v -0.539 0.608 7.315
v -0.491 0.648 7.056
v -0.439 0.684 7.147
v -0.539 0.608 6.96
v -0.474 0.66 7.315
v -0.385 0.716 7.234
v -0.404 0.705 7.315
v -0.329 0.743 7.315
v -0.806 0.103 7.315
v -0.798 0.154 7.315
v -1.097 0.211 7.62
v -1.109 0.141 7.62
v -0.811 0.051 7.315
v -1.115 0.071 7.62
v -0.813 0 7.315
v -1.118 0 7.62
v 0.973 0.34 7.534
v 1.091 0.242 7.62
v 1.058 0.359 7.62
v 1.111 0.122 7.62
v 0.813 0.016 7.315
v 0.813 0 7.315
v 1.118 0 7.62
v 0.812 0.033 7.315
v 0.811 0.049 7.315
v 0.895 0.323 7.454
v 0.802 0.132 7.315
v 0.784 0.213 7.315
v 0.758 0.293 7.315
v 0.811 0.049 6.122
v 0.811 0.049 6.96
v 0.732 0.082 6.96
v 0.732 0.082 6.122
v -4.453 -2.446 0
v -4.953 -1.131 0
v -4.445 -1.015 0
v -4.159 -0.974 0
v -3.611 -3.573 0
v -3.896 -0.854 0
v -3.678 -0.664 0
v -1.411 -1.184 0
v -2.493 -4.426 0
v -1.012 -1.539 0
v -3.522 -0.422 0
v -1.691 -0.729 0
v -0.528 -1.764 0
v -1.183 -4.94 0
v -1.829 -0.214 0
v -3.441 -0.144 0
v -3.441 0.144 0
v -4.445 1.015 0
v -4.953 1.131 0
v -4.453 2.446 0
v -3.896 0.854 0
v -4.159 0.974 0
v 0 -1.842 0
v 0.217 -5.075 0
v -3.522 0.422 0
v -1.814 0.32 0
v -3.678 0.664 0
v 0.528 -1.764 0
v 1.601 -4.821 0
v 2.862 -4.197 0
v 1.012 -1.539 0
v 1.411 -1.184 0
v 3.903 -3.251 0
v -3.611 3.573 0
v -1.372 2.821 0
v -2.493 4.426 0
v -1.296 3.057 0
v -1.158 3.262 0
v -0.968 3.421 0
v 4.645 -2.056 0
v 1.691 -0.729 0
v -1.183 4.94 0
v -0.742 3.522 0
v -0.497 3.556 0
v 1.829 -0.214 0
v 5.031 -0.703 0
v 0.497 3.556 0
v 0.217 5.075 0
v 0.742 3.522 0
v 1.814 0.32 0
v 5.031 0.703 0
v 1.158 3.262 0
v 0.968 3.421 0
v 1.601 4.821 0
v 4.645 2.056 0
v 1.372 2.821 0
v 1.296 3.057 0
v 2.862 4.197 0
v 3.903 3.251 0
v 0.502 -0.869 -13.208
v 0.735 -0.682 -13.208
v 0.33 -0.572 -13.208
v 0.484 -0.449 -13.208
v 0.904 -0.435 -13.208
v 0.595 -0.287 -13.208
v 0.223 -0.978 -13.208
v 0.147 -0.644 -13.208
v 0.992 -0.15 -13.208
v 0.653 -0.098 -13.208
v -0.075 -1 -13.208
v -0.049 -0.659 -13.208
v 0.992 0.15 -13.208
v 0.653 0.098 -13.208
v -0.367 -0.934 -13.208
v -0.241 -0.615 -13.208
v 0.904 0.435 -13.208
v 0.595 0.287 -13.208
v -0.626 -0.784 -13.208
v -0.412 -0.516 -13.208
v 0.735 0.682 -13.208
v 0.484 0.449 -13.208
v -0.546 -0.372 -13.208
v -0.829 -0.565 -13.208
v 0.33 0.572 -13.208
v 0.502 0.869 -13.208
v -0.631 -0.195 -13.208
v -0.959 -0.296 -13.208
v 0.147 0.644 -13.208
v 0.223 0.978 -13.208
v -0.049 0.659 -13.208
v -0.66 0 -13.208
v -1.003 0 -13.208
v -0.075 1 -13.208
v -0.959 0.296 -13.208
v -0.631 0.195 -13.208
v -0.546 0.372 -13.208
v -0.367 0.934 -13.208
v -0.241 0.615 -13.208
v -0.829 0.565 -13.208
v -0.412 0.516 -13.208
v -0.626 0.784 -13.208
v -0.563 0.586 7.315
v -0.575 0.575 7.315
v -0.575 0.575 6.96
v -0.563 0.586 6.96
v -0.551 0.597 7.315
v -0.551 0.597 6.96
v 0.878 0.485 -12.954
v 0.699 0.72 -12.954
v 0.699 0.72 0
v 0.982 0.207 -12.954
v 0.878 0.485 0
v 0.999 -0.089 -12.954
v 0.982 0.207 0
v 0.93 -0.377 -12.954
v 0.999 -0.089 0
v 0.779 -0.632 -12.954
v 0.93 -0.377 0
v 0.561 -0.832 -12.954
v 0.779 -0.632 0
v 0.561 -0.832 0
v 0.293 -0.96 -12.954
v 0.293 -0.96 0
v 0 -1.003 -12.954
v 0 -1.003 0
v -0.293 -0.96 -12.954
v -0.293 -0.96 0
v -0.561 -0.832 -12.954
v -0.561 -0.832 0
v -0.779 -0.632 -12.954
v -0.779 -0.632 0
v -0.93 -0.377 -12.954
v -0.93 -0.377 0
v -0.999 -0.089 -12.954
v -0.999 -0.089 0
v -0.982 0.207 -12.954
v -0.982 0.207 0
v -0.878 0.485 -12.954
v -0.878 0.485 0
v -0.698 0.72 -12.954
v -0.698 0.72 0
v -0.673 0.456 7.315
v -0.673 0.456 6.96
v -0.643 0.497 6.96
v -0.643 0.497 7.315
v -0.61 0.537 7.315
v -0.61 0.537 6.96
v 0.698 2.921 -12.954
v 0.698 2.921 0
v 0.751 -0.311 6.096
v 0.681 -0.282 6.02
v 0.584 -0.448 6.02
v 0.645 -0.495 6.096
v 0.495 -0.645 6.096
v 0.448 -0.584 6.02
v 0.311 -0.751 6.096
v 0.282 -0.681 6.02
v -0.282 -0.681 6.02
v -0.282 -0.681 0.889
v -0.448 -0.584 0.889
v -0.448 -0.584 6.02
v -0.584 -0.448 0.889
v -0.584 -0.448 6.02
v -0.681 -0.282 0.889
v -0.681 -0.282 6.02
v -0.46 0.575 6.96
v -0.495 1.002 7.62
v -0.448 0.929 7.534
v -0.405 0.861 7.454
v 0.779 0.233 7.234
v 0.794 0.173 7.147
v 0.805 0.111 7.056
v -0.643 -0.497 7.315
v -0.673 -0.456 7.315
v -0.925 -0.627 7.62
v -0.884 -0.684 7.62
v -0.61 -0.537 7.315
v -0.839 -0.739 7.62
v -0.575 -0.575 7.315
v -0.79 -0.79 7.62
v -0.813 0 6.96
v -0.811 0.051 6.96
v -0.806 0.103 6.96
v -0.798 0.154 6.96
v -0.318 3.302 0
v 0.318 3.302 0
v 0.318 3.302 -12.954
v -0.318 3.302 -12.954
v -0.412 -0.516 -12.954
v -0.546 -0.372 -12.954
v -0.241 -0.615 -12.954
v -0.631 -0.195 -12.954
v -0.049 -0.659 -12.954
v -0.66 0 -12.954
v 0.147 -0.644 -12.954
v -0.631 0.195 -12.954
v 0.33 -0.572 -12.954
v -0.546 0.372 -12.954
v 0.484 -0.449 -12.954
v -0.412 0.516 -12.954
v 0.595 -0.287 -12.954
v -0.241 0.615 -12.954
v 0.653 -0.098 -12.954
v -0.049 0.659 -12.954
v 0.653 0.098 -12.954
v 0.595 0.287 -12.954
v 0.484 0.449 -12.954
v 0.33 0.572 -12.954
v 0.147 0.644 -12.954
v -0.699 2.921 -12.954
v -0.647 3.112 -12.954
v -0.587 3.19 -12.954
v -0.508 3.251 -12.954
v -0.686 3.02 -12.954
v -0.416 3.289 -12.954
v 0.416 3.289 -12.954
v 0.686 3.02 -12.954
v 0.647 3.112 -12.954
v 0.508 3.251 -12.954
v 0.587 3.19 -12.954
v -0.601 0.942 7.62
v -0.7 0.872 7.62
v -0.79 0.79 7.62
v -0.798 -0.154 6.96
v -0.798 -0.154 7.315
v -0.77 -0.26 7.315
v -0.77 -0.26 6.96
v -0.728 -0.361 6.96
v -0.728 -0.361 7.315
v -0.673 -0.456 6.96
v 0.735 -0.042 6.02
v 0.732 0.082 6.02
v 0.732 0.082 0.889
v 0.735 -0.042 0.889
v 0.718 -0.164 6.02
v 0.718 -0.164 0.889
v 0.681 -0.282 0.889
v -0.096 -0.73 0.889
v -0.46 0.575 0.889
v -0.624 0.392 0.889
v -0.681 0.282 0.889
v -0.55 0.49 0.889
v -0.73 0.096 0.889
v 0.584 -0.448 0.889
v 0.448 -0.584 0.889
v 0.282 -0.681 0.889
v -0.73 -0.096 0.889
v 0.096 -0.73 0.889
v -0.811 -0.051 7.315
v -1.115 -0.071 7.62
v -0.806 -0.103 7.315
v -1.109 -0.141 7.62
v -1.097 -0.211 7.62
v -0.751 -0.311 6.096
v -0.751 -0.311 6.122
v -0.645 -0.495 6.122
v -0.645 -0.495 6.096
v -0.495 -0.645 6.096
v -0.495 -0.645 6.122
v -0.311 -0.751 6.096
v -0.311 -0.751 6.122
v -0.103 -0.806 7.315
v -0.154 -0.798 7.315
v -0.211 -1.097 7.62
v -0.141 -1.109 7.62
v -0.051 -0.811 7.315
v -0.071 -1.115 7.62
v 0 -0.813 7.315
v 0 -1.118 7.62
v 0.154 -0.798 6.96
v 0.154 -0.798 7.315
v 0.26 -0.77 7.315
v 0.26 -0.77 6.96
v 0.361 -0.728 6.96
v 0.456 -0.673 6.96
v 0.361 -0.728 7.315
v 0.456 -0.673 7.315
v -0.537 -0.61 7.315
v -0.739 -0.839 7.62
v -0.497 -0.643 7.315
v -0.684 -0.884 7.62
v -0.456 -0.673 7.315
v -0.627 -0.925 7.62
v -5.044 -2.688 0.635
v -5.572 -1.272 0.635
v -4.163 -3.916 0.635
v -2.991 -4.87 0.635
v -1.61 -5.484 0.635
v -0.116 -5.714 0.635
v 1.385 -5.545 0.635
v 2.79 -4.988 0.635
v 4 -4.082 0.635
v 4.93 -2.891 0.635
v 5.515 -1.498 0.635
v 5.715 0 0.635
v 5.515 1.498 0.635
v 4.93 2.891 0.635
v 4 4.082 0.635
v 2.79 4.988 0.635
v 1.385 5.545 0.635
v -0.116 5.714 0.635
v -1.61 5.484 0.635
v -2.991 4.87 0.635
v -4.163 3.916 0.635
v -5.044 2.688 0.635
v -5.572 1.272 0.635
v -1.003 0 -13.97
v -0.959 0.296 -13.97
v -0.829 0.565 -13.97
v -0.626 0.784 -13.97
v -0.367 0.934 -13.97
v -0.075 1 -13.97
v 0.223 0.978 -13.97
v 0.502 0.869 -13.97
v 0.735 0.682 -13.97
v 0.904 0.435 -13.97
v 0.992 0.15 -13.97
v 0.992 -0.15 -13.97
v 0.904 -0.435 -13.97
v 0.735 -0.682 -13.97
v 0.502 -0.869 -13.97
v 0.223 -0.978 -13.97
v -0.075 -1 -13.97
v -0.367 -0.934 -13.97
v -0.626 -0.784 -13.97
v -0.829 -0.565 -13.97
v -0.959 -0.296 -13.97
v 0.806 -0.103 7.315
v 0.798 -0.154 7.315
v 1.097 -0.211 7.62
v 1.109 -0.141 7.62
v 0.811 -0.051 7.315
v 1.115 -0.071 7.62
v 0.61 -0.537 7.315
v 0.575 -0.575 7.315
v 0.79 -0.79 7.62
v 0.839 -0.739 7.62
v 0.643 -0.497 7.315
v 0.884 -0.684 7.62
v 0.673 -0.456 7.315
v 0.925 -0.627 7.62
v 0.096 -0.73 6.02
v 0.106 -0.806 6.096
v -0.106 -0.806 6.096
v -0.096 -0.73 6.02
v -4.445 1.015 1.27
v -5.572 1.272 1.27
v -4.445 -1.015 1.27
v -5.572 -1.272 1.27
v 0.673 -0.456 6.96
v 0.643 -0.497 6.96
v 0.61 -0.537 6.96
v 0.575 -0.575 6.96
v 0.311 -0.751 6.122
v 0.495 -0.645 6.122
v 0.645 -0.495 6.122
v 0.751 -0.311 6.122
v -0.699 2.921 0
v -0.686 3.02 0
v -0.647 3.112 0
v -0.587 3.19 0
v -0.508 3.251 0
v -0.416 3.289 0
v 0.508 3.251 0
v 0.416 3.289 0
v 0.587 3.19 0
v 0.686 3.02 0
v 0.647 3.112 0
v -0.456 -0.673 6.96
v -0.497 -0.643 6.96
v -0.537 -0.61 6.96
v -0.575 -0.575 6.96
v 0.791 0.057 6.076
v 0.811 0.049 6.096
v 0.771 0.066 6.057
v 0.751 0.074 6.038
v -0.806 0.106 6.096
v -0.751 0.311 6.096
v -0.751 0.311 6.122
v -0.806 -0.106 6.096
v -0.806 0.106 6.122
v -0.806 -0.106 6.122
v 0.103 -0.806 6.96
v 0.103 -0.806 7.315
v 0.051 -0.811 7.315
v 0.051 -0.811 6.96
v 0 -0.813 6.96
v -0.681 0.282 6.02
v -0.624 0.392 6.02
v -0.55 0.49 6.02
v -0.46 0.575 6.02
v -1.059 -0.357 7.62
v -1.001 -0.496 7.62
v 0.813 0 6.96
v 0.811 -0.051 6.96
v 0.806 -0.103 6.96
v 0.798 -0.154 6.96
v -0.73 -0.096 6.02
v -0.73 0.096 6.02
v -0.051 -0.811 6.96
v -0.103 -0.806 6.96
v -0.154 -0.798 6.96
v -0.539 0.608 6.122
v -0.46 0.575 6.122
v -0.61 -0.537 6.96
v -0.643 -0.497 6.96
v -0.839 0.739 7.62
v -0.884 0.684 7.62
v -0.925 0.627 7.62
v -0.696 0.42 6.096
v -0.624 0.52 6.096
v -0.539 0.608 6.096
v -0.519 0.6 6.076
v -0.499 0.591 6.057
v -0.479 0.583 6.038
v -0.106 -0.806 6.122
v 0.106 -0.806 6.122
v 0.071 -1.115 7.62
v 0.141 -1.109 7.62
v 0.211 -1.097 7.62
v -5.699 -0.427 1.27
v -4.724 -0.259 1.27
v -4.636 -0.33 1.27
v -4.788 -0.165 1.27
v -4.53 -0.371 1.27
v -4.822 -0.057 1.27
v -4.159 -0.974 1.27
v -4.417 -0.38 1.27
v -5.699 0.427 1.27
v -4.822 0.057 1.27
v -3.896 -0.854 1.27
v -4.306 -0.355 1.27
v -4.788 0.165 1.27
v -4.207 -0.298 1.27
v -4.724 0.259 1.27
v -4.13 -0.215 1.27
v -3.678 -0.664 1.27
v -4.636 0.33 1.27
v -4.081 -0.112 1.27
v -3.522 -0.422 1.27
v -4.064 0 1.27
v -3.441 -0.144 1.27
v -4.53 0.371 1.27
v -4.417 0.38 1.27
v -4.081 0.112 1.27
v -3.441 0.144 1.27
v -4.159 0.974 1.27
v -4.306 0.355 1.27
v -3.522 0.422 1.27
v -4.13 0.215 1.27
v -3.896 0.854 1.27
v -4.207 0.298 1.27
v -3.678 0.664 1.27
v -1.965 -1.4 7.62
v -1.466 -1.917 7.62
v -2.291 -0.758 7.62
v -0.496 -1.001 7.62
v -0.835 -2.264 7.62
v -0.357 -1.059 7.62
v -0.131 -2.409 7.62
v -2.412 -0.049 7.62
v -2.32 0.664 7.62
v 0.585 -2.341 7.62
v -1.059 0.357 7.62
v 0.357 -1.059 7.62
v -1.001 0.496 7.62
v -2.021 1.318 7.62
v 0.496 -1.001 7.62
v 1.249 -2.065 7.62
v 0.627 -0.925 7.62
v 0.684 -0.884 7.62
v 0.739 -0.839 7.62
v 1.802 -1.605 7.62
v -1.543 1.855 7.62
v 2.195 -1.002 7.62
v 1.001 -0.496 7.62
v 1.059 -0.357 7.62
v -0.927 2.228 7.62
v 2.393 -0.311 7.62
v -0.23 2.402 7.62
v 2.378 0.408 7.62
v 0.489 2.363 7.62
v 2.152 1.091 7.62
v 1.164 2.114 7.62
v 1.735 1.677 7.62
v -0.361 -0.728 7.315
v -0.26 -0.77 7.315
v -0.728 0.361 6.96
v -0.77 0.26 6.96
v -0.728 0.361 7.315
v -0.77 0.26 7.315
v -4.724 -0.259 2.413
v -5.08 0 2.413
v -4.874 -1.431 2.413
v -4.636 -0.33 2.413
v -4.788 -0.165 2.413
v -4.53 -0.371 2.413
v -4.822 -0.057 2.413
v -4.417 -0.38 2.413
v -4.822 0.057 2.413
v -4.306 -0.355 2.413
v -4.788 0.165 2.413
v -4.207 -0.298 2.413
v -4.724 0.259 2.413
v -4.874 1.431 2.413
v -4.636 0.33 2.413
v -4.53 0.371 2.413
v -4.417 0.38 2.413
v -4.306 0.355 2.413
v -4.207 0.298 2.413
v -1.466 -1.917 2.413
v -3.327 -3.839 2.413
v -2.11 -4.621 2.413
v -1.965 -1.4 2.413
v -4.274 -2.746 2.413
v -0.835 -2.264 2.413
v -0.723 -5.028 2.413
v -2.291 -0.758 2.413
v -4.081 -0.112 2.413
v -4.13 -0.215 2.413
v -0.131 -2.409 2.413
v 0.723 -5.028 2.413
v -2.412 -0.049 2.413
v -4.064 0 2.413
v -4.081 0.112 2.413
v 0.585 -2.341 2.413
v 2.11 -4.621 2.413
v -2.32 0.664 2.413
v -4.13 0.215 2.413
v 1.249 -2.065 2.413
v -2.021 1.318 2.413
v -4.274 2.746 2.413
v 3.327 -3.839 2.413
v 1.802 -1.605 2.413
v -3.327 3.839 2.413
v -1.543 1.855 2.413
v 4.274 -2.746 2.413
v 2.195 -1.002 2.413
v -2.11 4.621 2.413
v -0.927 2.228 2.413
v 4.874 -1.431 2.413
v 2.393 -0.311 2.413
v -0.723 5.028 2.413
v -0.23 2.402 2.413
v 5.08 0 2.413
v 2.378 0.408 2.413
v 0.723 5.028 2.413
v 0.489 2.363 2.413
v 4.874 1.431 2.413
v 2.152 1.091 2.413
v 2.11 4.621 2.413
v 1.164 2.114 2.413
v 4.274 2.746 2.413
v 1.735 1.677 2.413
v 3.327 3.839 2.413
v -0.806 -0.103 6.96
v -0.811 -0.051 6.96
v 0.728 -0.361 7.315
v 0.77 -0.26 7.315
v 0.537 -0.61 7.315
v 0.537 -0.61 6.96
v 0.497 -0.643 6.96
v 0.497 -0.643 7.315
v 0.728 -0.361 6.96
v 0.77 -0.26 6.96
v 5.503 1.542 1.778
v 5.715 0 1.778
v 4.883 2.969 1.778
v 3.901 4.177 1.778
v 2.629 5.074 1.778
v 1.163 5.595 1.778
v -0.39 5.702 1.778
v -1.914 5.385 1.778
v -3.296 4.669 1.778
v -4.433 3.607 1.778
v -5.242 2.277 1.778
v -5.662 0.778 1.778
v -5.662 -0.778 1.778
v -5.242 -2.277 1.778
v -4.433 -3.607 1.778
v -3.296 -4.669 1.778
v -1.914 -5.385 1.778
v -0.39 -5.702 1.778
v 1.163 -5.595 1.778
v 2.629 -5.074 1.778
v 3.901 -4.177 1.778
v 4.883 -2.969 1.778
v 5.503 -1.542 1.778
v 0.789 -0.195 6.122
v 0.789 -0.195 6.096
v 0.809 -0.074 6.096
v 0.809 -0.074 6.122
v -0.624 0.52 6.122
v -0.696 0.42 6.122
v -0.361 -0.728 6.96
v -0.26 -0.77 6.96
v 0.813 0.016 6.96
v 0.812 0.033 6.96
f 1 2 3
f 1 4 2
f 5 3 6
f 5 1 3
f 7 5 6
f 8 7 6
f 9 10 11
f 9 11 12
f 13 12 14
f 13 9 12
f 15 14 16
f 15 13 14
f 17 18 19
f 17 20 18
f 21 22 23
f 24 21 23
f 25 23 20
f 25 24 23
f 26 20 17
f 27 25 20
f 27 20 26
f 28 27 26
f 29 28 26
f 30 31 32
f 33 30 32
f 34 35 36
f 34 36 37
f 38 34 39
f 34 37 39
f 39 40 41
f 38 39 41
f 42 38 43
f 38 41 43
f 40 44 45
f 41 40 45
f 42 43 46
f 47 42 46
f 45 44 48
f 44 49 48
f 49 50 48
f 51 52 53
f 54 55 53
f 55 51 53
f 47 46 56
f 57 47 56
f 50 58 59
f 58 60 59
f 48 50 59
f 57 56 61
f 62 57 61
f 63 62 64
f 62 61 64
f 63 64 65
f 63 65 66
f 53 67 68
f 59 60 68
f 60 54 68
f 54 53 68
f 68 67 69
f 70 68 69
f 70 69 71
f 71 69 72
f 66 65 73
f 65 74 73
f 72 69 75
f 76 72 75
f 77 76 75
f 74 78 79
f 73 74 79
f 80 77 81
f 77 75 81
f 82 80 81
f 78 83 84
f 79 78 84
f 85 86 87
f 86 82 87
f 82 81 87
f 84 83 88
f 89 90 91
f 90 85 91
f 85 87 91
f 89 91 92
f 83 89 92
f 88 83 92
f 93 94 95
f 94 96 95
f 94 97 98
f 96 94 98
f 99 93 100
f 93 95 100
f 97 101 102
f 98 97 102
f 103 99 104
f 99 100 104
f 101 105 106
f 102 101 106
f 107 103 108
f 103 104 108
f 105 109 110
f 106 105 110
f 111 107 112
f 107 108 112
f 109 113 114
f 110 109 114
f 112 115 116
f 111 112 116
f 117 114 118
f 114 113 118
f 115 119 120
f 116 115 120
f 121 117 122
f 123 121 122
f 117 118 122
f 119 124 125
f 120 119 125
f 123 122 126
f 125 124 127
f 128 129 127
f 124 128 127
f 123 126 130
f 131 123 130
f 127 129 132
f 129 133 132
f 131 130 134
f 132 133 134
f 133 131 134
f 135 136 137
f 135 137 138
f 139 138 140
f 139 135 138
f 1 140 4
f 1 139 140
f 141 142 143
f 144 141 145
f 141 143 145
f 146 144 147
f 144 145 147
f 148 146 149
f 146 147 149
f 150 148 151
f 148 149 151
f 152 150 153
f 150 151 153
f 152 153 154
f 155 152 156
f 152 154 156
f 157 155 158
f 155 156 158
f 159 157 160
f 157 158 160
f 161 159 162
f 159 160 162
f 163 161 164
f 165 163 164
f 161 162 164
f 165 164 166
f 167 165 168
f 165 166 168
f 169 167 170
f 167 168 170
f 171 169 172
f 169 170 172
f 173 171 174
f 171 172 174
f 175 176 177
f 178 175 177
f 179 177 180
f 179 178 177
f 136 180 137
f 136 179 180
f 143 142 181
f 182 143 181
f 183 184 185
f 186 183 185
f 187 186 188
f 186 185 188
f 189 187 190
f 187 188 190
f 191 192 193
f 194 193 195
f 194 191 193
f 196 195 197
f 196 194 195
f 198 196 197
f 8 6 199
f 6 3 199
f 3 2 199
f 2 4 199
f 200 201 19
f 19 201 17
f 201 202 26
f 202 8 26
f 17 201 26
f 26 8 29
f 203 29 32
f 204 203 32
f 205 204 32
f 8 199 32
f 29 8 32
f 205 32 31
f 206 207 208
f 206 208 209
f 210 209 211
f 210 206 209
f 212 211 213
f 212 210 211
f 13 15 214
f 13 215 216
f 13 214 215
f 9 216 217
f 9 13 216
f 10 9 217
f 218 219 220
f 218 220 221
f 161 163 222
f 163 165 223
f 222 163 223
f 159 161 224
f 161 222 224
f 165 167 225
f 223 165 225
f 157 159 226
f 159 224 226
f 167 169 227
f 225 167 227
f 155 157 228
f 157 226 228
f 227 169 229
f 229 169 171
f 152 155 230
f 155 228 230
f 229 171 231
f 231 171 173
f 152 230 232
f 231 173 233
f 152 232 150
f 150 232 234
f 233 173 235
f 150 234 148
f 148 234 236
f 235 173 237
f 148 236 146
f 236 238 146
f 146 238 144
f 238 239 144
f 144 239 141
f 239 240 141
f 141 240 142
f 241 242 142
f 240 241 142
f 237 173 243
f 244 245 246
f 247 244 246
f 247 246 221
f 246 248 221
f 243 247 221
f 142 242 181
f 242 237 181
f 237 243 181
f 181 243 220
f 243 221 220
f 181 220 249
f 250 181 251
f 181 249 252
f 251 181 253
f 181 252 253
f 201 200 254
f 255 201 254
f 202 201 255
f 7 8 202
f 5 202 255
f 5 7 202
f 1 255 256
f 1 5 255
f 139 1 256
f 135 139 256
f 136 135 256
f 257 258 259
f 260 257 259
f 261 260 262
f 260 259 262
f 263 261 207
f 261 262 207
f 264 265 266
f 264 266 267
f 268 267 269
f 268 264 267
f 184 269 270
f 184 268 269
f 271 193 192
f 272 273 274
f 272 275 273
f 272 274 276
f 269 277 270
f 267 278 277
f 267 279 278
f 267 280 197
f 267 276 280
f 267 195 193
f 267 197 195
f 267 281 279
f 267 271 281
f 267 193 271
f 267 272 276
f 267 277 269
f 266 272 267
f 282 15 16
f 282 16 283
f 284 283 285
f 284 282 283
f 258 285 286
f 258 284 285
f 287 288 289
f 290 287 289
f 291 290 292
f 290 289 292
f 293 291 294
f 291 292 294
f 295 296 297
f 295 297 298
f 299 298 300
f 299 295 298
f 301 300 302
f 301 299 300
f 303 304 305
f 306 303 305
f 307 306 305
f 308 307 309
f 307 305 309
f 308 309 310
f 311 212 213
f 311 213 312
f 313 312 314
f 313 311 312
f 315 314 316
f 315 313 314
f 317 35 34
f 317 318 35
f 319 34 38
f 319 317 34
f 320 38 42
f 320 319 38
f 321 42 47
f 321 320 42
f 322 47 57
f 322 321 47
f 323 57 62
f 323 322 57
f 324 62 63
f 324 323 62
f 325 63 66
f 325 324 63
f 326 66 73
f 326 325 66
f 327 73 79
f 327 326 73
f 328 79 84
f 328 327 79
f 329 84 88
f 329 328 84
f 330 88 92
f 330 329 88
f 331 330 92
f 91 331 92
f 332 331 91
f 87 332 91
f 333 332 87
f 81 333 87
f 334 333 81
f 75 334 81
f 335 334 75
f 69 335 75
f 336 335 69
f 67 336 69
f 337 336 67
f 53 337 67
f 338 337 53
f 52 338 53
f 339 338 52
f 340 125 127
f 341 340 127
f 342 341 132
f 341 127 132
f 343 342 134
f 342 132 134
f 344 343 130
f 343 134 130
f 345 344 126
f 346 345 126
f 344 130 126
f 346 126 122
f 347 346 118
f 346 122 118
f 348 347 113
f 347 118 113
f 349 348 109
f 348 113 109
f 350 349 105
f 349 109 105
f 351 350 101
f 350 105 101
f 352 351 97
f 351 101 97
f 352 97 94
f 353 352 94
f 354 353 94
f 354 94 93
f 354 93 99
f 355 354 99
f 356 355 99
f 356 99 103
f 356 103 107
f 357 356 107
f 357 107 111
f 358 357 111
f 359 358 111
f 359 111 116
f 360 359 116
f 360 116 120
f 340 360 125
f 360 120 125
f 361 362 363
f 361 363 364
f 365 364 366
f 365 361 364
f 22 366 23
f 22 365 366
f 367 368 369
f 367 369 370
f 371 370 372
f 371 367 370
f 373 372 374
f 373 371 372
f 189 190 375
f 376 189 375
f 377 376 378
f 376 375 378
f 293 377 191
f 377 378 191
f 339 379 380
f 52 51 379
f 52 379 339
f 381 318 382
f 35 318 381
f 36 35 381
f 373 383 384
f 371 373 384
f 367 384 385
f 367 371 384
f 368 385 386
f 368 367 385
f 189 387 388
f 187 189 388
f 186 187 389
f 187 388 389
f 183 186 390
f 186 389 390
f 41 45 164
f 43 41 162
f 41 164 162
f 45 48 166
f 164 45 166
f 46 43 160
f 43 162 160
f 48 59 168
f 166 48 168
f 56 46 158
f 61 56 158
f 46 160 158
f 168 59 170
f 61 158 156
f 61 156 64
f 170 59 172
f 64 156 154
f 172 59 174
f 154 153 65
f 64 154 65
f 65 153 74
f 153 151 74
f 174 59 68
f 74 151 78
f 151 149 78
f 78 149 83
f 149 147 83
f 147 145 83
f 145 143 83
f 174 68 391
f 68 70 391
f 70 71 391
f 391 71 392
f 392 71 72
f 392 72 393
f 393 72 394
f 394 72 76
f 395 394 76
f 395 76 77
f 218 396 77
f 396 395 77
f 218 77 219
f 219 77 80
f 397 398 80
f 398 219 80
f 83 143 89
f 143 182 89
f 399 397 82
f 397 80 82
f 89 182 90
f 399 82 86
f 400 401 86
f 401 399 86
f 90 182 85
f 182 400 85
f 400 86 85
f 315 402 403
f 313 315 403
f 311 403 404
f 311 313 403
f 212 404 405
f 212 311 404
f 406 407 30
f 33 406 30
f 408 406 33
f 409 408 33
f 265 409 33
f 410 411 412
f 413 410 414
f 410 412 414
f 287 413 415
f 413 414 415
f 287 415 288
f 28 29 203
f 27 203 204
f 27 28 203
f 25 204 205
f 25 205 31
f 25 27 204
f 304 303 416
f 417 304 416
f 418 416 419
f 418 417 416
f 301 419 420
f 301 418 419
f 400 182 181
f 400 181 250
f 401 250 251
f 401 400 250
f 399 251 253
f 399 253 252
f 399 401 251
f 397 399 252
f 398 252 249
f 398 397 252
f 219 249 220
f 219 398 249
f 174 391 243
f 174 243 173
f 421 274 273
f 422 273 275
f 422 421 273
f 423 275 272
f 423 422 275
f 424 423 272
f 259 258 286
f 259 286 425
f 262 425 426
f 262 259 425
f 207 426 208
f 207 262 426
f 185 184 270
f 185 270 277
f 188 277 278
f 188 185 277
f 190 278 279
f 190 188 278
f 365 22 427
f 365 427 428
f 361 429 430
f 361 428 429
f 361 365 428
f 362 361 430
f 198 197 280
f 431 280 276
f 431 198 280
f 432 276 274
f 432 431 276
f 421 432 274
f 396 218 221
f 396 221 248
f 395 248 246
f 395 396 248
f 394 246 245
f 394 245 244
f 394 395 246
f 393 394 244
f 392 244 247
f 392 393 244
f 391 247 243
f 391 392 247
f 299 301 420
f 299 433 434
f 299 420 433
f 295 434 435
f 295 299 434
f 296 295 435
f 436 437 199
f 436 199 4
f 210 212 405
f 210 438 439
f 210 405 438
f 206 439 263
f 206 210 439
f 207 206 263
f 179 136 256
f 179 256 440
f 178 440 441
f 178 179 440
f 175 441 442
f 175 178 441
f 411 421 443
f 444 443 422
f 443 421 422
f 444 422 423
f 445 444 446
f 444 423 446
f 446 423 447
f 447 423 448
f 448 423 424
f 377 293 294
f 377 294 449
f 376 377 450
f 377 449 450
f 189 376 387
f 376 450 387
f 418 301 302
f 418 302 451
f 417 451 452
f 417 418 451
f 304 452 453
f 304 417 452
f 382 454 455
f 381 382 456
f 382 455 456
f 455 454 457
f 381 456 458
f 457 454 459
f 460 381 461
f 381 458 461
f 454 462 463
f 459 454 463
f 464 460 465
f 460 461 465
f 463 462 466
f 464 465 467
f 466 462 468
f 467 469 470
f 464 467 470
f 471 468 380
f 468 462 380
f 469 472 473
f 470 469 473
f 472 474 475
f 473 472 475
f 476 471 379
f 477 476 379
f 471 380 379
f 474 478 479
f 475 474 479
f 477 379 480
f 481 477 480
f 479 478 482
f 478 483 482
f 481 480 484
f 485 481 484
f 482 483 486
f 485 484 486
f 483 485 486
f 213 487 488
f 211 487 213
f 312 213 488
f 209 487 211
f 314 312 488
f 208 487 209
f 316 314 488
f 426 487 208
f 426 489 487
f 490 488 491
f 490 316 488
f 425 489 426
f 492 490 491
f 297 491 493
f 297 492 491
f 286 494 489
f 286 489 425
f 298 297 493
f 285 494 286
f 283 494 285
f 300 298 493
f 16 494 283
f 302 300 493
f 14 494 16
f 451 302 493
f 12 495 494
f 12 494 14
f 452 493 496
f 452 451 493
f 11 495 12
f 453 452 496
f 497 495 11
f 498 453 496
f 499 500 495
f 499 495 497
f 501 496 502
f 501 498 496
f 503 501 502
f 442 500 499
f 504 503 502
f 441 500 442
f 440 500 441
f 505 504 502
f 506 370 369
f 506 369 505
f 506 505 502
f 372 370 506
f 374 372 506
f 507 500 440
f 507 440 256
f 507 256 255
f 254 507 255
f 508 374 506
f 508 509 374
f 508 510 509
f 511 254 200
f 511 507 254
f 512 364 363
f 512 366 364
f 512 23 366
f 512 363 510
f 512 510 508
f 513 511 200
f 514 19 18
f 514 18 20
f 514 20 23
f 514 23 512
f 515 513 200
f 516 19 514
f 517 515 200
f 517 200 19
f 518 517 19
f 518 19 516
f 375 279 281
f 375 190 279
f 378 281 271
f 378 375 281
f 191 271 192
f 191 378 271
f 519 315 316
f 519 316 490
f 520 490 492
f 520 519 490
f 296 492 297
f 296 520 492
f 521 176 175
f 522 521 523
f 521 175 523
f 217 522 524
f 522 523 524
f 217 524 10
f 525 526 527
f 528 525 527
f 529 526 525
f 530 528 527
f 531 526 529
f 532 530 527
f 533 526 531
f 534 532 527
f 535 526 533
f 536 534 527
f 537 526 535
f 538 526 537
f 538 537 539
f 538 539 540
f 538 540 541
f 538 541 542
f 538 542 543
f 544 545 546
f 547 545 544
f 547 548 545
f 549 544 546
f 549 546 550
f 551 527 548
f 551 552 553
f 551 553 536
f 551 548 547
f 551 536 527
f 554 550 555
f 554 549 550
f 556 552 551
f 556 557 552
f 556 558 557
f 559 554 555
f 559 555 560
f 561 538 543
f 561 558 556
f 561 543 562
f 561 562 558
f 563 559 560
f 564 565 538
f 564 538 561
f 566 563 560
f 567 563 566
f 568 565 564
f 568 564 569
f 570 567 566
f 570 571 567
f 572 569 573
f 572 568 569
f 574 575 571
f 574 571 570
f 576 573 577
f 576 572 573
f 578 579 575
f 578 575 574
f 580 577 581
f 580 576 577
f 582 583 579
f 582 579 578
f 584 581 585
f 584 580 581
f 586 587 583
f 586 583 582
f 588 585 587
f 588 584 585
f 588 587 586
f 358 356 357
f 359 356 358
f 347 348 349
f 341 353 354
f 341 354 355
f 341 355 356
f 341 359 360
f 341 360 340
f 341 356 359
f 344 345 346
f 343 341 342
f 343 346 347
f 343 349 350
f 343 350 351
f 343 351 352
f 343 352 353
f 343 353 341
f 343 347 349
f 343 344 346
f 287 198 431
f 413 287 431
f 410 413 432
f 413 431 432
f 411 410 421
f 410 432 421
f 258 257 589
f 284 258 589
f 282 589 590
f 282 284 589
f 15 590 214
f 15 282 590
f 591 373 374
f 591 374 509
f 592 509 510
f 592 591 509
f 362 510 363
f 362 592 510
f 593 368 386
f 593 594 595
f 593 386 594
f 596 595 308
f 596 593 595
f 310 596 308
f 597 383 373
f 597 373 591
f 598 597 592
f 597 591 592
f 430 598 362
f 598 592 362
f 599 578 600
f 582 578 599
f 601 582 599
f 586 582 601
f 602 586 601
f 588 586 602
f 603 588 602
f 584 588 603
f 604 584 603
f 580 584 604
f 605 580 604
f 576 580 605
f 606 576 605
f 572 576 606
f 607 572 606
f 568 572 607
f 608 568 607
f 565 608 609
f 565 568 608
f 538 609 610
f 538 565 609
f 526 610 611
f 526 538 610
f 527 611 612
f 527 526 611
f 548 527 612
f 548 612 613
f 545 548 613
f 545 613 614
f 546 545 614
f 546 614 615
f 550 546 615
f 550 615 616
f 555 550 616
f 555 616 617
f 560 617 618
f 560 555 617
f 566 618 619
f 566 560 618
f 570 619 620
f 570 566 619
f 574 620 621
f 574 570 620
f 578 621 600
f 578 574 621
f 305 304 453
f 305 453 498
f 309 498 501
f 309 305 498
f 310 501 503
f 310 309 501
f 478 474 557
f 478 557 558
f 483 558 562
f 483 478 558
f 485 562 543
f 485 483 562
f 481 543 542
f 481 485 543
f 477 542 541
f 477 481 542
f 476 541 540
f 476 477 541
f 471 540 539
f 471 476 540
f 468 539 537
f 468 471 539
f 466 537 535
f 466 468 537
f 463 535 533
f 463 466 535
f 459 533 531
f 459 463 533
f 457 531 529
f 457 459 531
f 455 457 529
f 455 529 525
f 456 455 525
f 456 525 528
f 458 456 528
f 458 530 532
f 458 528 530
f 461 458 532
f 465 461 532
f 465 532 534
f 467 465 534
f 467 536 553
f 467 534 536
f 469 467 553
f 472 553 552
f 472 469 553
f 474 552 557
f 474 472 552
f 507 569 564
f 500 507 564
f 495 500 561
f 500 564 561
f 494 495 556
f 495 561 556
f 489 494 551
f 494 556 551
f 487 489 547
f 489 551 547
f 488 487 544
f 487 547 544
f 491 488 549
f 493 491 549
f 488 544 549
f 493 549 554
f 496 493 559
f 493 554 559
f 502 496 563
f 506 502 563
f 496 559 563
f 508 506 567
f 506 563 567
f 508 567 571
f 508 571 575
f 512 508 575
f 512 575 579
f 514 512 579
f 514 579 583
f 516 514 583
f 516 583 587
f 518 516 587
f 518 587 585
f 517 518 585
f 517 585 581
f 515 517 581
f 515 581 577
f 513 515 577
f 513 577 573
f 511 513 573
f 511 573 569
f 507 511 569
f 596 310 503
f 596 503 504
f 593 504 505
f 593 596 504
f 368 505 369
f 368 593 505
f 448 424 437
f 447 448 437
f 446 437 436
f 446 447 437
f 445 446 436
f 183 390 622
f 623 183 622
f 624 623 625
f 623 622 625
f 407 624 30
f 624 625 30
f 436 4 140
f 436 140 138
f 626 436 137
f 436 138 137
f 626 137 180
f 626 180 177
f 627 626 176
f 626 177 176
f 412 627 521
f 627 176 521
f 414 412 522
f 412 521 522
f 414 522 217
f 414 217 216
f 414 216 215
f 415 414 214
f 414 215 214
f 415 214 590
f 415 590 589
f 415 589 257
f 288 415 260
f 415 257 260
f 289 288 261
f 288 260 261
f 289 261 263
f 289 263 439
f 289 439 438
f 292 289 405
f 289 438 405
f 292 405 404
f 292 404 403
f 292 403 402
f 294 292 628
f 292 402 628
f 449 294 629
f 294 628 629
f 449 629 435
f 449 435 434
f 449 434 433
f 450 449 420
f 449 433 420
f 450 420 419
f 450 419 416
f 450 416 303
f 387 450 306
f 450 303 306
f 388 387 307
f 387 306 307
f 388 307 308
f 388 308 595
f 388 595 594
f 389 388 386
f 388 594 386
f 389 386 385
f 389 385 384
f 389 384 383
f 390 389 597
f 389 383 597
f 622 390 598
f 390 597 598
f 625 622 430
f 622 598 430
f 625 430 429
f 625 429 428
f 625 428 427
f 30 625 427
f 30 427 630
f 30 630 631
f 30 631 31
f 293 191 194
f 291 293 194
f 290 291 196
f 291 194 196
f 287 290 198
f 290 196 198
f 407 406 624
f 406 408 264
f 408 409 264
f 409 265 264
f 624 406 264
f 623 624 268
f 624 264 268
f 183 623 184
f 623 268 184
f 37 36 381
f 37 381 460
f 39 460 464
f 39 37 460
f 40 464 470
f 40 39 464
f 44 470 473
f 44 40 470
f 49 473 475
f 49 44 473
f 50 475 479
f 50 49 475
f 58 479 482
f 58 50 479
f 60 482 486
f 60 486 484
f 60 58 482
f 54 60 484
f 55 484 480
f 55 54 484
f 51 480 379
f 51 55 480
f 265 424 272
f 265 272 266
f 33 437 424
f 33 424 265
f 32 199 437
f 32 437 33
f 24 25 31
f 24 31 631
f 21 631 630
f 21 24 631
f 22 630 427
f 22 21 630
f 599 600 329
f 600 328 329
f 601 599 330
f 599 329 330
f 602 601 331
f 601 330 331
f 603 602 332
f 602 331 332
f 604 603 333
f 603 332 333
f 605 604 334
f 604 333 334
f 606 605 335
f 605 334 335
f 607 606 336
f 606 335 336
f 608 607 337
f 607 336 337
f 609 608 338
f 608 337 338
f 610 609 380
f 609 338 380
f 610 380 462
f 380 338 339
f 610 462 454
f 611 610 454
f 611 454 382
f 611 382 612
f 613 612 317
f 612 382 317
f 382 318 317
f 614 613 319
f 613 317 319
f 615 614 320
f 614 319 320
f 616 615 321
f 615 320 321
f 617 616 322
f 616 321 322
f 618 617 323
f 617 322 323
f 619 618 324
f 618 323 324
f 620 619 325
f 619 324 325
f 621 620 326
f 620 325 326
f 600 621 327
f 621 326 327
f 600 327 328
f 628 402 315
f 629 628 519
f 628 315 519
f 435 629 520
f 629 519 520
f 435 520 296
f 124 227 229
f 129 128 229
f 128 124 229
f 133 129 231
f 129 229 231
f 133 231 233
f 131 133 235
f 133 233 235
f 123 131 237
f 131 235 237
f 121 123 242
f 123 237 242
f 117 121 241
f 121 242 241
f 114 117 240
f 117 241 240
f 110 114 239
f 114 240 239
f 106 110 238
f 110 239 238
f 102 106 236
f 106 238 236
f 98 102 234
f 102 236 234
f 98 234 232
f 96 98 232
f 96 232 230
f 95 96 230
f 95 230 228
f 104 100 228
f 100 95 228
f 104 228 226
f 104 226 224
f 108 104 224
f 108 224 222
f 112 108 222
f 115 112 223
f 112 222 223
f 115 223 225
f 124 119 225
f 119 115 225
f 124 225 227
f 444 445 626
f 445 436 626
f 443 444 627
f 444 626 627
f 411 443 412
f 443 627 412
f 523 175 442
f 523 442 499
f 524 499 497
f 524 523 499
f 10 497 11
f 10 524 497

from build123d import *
from build123d.topology import SkipClean

# Parameters (mm, degrees)
EXTRUDE1_DEPTH               = 0.000254
SKETCH8_R                    = 2.413
EXTRUDE8_DEPTH               = 7.62
SKETCH6_R                    = 5.715
EXTRUDE6_DEPTH               = 2.413
SKETCH4_R                    = 0.254
EXTRUDE4_DEPTH               = 6.731
SKETCH5_R                    = 1.0033
EXTRUDE5_DEPTH               = 12.954
FILLET2_R                    = 0.889
CHAMFER1_SIZE                = 0.635
CHAMFER3_SIZE                = 0.635
EXTRUDE9_DEPTH               = 12.954
EXTRUDE11_DEPTH              = 6.731
CIRPATTERN1_COUNT            = 8
EXTRUDE12_DEPTH              = 6.731
CHAMFER4_SIZE                = 0.381
CHAMFER4_SIZE2               = 0.659911358
EXTRUDE13_DEPTH              = 0.6604
CUT_REVOLVE1_ANGLE           = 130
CUT_REVOLVE1_OTHER_WAY_ANGLE = 90
BOSS_EXTRUDE1_DEPTH          = 6.071088642
CUT_EXTRUDE1_DEPTH           = 0.838688642
CHAMFER5_SIZE                = 0.1016
CHAMFER6_SIZE                = 0.3048
SKETCH27_R                   = 0.381
CUT_EXTRUDE5_DEPTH           = 16.268548261
CUT_EXTRUDE7_DEPTH           = 1.27
SKETCH29_R                   = 0.6604
BOSS_EXTRUDE2_DEPTH          = 1.016
BOSS_EXTRUDE3_START          = -0.762
SKETCH30_R                   = 1.0033
BOSS_EXTRUDE3_DEPTH          = 0.762


with BuildPart() as part:
    # Sketch1 → Extrude1 (new body)
    with BuildSketch(Plane.XY):
        with BuildLine():
            Line((-1.242889362, 3.556), (-1.813523477, 0.319773119))
            ThreePointArc((-1.813523477, 0.319773119), (0, -1.8415), (1.813523477, 0.319773119))
            Line((1.813523477, 0.319773119), (1.242889362, 3.556))
            Line((1.242889362, 3.556), (-1.242889362, 3.556))
        make_face()
    extrude(amount=EXTRUDE1_DEPTH)

    # Sketch8 → Extrude8 (add)
    with BuildSketch(Plane.XY.offset(0.000254)):
        with Locations(Location((0, 0, 0), (0, 0, 129.743387424))):
            Circle(SKETCH8_R)
    extrude(amount=EXTRUDE8_DEPTH)

    # Sketch6 → Extrude6 (add)
    with BuildSketch(Plane.XY.offset(0.000254)):
        Circle(SKETCH6_R)
    extrude(amount=EXTRUDE6_DEPTH)

    # Sketch4 → Extrude4 (cut)
    with BuildSketch(Plane.XY.offset(7.620254)):
        Circle(SKETCH4_R)
    extrude(amount=-EXTRUDE4_DEPTH, mode=Mode.SUBTRACT)

    # Sketch5 → Extrude5 (add)
    with BuildSketch(Plane(origin=(0, 0, 0), x_dir=(-1, 0, 0), z_dir=(0, 0, -1))):
        with Locations(Location((0, 0, 0), (0, 0, 180))):
            Circle(SKETCH5_R)
    extrude(amount=EXTRUDE5_DEPTH)

    # Fillet2
    fillet2_edges = [part.edges().sort_by_distance(p)[0] for p in [
        (1.242889362, 3.556, 0.000127),
        (-1.242889362, 3.556, 0.000127),
    ]]
    fillet(fillet2_edges, radius=FILLET2_R)

    # Chamfer1
    chamfer1_edges = [part.edges().sort_by_distance(p)[0] for p in [
        (-5.715, 0, 0.000254),
    ]]
    chamfer(chamfer1_edges, length=CHAMFER1_SIZE)

    # Chamfer3
    chamfer3_edges = [part.edges().sort_by_distance(p)[0] for p in [
        (-5.715, 0, 2.413254),
    ]]
    chamfer(chamfer3_edges, length=CHAMFER3_SIZE)

    # Sketch9 → Extrude9 (add)
    with BuildSketch(Plane(origin=(0, 0, 0), x_dir=(-1, 0, 0), z_dir=(0, 0, -1))):
        with BuildLine():
            Line((-0.3175, 3.302), (0.3175, 3.302))
            ThreePointArc((0.3175, 3.302), (0.586907684, 3.190407684), (0.6985, 2.921))
            Line((0.6985, 2.921), (0.6985, 0))
            Line((0.6985, 0), (-0.6985, 0))
            Line((-0.6985, 0), (-0.6985, 2.921))
            ThreePointArc((-0.6985, 2.921), (-0.586907684, 3.190407684), (-0.3175, 3.302))
        make_face()
    extrude(amount=EXTRUDE9_DEPTH)

    # Sketch17 → Extrude11 (cut)
    with BuildSketch(Plane.XY.offset(7.620254)):
        with BuildLine():
            Line((0, 0), (0, 0.8128))
            ThreePointArc((0, 0.8128), (0.077181384, 0.80912723), (0.153665255, 0.798142111))
            ThreePointArc((0.153665255, 0.798142111), (0.281884616, 0.680529664), (0.455713955, 0.673029443))
            ThreePointArc((0.455713955, 0.673029443), (0.517563871, 0.626714831), (0.574736392, 0.574736392))
            Line((0.574736392, 0.574736392), (0, 0))
        make_face()
    extrude11 = extrude(amount=-EXTRUDE11_DEPTH, mode=Mode.SUBTRACT)

    # CirPattern1: Extrude11 ×8 about axis
    cirpattern1_axis = Axis((0, 0, 0), (0, 0, 1))
    for i in range(1, CIRPATTERN1_COUNT):
        add(extrude11.rotate(cirpattern1_axis, i * 360 / CIRPATTERN1_COUNT), mode=Mode.SUBTRACT)

    # Sketch18 → Extrude12 (add)
    with BuildSketch(Plane.XY.offset(7.620254)):
        Polygon((-0.539167209, 0.608229037), (0.811331666, 0.048834087), (0.986294531, 0.471231809), (-0.364204343, 1.030626759), align=None)
    extrude(amount=-EXTRUDE12_DEPTH)

    # Chamfer4
    chamfer4_edges = [part.edges().sort_by_distance(p)[0] for p in [
        (0.136082229, 0.328531562, 7.620254),
    ]]
    chamfer4_side = [part.faces().sort_by_distance(p)[0] for p in [
        (1.499116567, -1.802914954, 7.620254),
    ]]
    chamfer(chamfer4_edges, length=CHAMFER4_SIZE, length2=CHAMFER4_SIZE2, reference=chamfer4_side[0])

    # Sketch19 → Extrude13 (cut)
    with SkipClean():  # the faces are left unmerged after this step: merging them gives an invalid solid
        with BuildSketch(Plane.XY.offset(7.620254)):
            with BuildLine():
                Line((0.811331666, 0.048834087), (-0.539167209, 0.608229037))
                ThreePointArc((-0.539167209, 0.608229037), (-0.311045094, -0.750929284), (0.811331666, 0.048834087))
            make_face()
        extrude(amount=-EXTRUDE13_DEPTH, mode=Mode.SUBTRACT)

    # Sketch20 → Cut-Revolve1 (revolve, cut)
    with SkipClean():  # the faces are left unmerged after this step: merging them gives an invalid solid
        with BuildSketch(Plane(origin=(0, 0, 0), x_dir=(0, 0, -1), z_dir=(1, 0, 0))):
            Polygon((-6.959854, -0.8128), (-6.959854, 0), (-6.147054, 0), align=None)
        revolve(axis=Axis((0, 0, 7.389643883), (0, 0, -1)), revolution_arc=CUT_REVOLVE1_ANGLE, mode=Mode.SUBTRACT)

    # Sketch20 → Cut-Revolve1 other way (revolve, cut)
    with SkipClean():  # the faces are left unmerged after this step: merging them gives an invalid solid
        with BuildSketch(Plane(origin=(0, 0, 0), x_dir=(0, 0, -1), z_dir=(1, 0, 0))):
            Polygon((-6.959854, -0.8128), (-6.959854, 0), (-6.147054, 0), align=None)
        revolve(axis=Axis((0, 0, 7.389643883), (0, 0, 1)), revolution_arc=CUT_REVOLVE1_OTHER_WAY_ANGLE, mode=Mode.SUBTRACT)

    # Sketch21 → Boss-Extrude1 (add)
    with SkipClean():  # the faces are left unmerged after this step: merging them gives an invalid solid
        with BuildSketch(Plane.XY.offset(6.960342642)):
            with BuildLine():
                Line((-0.459893976, 0.575392988), (-0.539167209, 0.608229037))
                ThreePointArc((-0.539167209, 0.608229037), (-0.311045094, -0.750929284), (0.811331666, 0.048834087))
                Line((0.811331666, 0.048834087), (0.732058433, 0.081670135))
                ThreePointArc((0.732058433, 0.081670135), (-0.281884616, -0.680529664), (-0.459893976, 0.575392988))
            make_face()
        extrude(amount=-BOSS_EXTRUDE1_DEPTH)

    # Sketch22 → Cut-Extrude1 (cut)
    with SkipClean():  # the faces are left unmerged after this step: merging them gives an invalid solid
        with BuildSketch(Plane.XY.offset(6.960342642)):
            with BuildLine():
                Line((-0.459893976, 0.575392988), (-0.539167209, 0.608229037))
                ThreePointArc((-0.539167209, 0.608229037), (-0.311045094, -0.750929284), (0.811331666, 0.048834087))
                Line((0.811331666, 0.048834087), (0.732058433, 0.081670135))
                ThreePointArc((0.732058433, 0.081670135), (-0.281884616, -0.680529664), (-0.459893976, 0.575392988))
            make_face()
        extrude(amount=-CUT_EXTRUDE1_DEPTH, mode=Mode.SUBTRACT)

    # Chamfer5
    # the kernel refuses this chamfer: 0.1016 mm, written as the material it takes off along each edge
    with BuildSketch(Plane(origin=(0, 0, 6.121654), x_dir=(-0.3826834323650876, -0.9238795325112875, 0), z_dir=(0.9238795325112875, -0.3826834323650876, 0))) as chamfer5_piece_1_section:
        Polygon((0.7366 + CHAMFER5_SIZE, 0), (0.7366, CHAMFER5_SIZE), (0.7366, 0), align=None)
    chamfer5_piece_1 = revolve(axis=Axis((0, 0, 6.121654), (0, 0, -1)), revolution_arc=45, mode=Mode.PRIVATE)
    chamfer5_piece_1 = chamfer5_piece_1 & Plane(origin=(0, 0, 6.086219336), x_dir=(-0.6633454831704748, 0.74831328329606, 0), z_dir=(0, 0, 1)) * Cylinder(0.8128, 4, mode=Mode.PRIVATE)
    add(chamfer5_piece_1, mode=Mode.SUBTRACT)
    with BuildSketch(Plane(origin=(0, 0, 6.121654), x_dir=(0.3826834323650712, -0.9238795325112945, 0), z_dir=(0.9238795325112945, 0.3826834323650712, 0))) as chamfer5_piece_2_section:
        Polygon((0.7366 + CHAMFER5_SIZE, 0), (0.7366, CHAMFER5_SIZE), (0.7366, 0), align=None)
    chamfer5_piece_2 = revolve(axis=Axis((0, 0, 6.121654), (0, 0, -1)), revolution_arc=45, mode=Mode.PRIVATE)
    chamfer5_piece_2 = chamfer5_piece_2 & Plane(origin=(0, 0, 6.086219336), x_dir=(-0.6633454831704748, 0.74831328329606, 0), z_dir=(0, 0, 1)) * Cylinder(0.8128, 4, mode=Mode.PRIVATE)
    add(chamfer5_piece_2, mode=Mode.SUBTRACT)
    with BuildSketch(Plane(origin=(0, 0, 6.121654), x_dir=(-0.9238795325112938, -0.3826834323650728, 0), z_dir=(0.3826834323650728, -0.9238795325112938, 0))) as chamfer5_piece_3_section:
        Polygon((0.7366 + CHAMFER5_SIZE, 0), (0.7366, CHAMFER5_SIZE), (0.7366, 0), align=None)
    chamfer5_piece_3 = revolve(axis=Axis((0, 0, 6.121654), (0, 0, -1)), revolution_arc=45, mode=Mode.PRIVATE)
    chamfer5_piece_3 = chamfer5_piece_3 & Plane(origin=(0, 0, 6.086219336), x_dir=(-0.6633454831704748, 0.74831328329606, 0), z_dir=(0, 0, 1)) * Cylinder(0.8128, 4, mode=Mode.PRIVATE)
    add(chamfer5_piece_3, mode=Mode.SUBTRACT)
    with BuildSketch(Plane(origin=(0, 0, 6.121654), x_dir=(-0.9238795325112764, 0.3826834323651145, 0), z_dir=(-0.3826834323651145, -0.9238795325112764, 0))) as chamfer5_piece_4_section:
        Polygon((0.7366 + CHAMFER5_SIZE, 0), (0.7366, CHAMFER5_SIZE), (0.7366, 0), align=None)
    chamfer5_piece_4 = revolve(axis=Axis((0, 0, 6.121654), (0, 0, -1)), revolution_arc=49.190233443, mode=Mode.PRIVATE)
    chamfer5_piece_4 = chamfer5_piece_4 & Plane(origin=(0, 0, 6.085867455), x_dir=(-0.6633454831704748, 0.74831328329606, 0), z_dir=(0, 0, 1)) * Cylinder(0.8128, 4, mode=Mode.PRIVATE)
    chamfer5_piece_4 = split(chamfer5_piece_4, bisect_by=Plane(origin=(-0.544175649, 0.610303601, 6.085867455), z_dir=(-0.38268343236508656, -0.9238795325112882, 0)), keep=Keep.TOP, mode=Mode.PRIVATE)
    add(chamfer5_piece_4, mode=Mode.SUBTRACT)
    with BuildSketch(Plane(origin=(0, 0, 6.121654), x_dir=(0.9238795325112772, -0.3826834323651127, 0), z_dir=(0.3826834323651127, 0.9238795325112772, 0))) as chamfer5_piece_5_section:
        Polygon((0.7366 + CHAMFER5_SIZE, 0), (0.7366, CHAMFER5_SIZE), (0.7366, 0), align=None)
    chamfer5_piece_5 = revolve(axis=Axis((0, 0, 6.121654), (0, 0, -1)), revolution_arc=45, mode=Mode.PRIVATE)
    chamfer5_piece_5 = chamfer5_piece_5 & Plane(origin=(0, 0, 6.086219336), x_dir=(-0.6633454831704748, 0.74831328329606, 0), z_dir=(0, 0, 1)) * Cylinder(0.8128, 4, mode=Mode.PRIVATE)
    add(chamfer5_piece_5, mode=Mode.SUBTRACT)
    with BuildSketch(Plane(origin=(0, 0, 6.121654), x_dir=(0.8934479656215565, 0.44916670928142266, 0), z_dir=(-0.44916670928142266, 0.8934479656215565, 0))) as chamfer5_piece_6_section:
        Polygon((0.7366 + CHAMFER5_SIZE, 0), (0.7366, CHAMFER5_SIZE), (0.7366, 0), align=None)
    chamfer5_piece_6 = revolve(axis=Axis((0, 0, 6.121654), (0, 0, -1)), revolution_arc=49.190233443, mode=Mode.PRIVATE)
    chamfer5_piece_6 = chamfer5_piece_6 & Plane(origin=(0, 0, 6.085867455), x_dir=(-0.6633454831704748, 0.74831328329606, 0), z_dir=(0, 0, 1)) * Cylinder(0.8128, 4, mode=Mode.PRIVATE)
    chamfer5_piece_6 = split(chamfer5_piece_6, bisect_by=Plane(origin=(0.816340106, 0.046759523, 6.085867455), z_dir=(-0.38268343236508556, -0.9238795325112885, 0)), keep=Keep.TOP, mode=Mode.PRIVATE)
    add(chamfer5_piece_6, mode=Mode.SUBTRACT)

    # Chamfer6
    chamfer6_edges = [part.edges().sort_by_distance(p)[0] for p in [
        (-0.311045094, -0.750929284, 7.620254),
    ]]
    chamfer(chamfer6_edges, length=CHAMFER6_SIZE)

    # Sketch27 → Cut-Extrude5 (cut, through all)
    with BuildSketch(Plane.XY):
        with Locations((-4.445, 0)):
            Circle(SKETCH27_R)
    extrude(amount=CUT_EXTRUDE5_DEPTH, mode=Mode.SUBTRACT)

    # Sketch28 → Cut-Extrude7 (cut)
    with BuildSketch(Plane(origin=(0, 0, 0.000254), x_dir=(-1, 0, 0), z_dir=(0, 0, -1))):
        with BuildLine():
            Line((4.445, 1.014677811), (6.190751279, 1.413187392))
            ThreePointArc((6.190751279, 1.413187392), (6.35, 0), (6.190751279, -1.413187392))
            Line((6.190751279, -1.413187392), (4.445, -1.014677811))
            ThreePointArc((4.445, -1.014677811), (3.430322189, 0), (4.445, 1.014677811))
        make_face()
    extrude(amount=-CUT_EXTRUDE7_DEPTH, mode=Mode.SUBTRACT)

    # Sketch29 → Boss-Extrude2 (add)
    with BuildSketch(Plane(origin=(0, 0, -12.954), x_dir=(-1, 0, 0), z_dir=(0, 0, -1))):
        Circle(SKETCH29_R)
    extrude(amount=BOSS_EXTRUDE2_DEPTH)

    # Sketch30 → Boss-Extrude3 (add)
    with BuildSketch(Plane(origin=(0, 0, -13.97), x_dir=(-1, 0, 0), z_dir=(0, 0, -1)).offset(BOSS_EXTRUDE3_START)):
        Circle(SKETCH30_R)
    extrude(amount=BOSS_EXTRUDE3_DEPTH)


solid = part.part
